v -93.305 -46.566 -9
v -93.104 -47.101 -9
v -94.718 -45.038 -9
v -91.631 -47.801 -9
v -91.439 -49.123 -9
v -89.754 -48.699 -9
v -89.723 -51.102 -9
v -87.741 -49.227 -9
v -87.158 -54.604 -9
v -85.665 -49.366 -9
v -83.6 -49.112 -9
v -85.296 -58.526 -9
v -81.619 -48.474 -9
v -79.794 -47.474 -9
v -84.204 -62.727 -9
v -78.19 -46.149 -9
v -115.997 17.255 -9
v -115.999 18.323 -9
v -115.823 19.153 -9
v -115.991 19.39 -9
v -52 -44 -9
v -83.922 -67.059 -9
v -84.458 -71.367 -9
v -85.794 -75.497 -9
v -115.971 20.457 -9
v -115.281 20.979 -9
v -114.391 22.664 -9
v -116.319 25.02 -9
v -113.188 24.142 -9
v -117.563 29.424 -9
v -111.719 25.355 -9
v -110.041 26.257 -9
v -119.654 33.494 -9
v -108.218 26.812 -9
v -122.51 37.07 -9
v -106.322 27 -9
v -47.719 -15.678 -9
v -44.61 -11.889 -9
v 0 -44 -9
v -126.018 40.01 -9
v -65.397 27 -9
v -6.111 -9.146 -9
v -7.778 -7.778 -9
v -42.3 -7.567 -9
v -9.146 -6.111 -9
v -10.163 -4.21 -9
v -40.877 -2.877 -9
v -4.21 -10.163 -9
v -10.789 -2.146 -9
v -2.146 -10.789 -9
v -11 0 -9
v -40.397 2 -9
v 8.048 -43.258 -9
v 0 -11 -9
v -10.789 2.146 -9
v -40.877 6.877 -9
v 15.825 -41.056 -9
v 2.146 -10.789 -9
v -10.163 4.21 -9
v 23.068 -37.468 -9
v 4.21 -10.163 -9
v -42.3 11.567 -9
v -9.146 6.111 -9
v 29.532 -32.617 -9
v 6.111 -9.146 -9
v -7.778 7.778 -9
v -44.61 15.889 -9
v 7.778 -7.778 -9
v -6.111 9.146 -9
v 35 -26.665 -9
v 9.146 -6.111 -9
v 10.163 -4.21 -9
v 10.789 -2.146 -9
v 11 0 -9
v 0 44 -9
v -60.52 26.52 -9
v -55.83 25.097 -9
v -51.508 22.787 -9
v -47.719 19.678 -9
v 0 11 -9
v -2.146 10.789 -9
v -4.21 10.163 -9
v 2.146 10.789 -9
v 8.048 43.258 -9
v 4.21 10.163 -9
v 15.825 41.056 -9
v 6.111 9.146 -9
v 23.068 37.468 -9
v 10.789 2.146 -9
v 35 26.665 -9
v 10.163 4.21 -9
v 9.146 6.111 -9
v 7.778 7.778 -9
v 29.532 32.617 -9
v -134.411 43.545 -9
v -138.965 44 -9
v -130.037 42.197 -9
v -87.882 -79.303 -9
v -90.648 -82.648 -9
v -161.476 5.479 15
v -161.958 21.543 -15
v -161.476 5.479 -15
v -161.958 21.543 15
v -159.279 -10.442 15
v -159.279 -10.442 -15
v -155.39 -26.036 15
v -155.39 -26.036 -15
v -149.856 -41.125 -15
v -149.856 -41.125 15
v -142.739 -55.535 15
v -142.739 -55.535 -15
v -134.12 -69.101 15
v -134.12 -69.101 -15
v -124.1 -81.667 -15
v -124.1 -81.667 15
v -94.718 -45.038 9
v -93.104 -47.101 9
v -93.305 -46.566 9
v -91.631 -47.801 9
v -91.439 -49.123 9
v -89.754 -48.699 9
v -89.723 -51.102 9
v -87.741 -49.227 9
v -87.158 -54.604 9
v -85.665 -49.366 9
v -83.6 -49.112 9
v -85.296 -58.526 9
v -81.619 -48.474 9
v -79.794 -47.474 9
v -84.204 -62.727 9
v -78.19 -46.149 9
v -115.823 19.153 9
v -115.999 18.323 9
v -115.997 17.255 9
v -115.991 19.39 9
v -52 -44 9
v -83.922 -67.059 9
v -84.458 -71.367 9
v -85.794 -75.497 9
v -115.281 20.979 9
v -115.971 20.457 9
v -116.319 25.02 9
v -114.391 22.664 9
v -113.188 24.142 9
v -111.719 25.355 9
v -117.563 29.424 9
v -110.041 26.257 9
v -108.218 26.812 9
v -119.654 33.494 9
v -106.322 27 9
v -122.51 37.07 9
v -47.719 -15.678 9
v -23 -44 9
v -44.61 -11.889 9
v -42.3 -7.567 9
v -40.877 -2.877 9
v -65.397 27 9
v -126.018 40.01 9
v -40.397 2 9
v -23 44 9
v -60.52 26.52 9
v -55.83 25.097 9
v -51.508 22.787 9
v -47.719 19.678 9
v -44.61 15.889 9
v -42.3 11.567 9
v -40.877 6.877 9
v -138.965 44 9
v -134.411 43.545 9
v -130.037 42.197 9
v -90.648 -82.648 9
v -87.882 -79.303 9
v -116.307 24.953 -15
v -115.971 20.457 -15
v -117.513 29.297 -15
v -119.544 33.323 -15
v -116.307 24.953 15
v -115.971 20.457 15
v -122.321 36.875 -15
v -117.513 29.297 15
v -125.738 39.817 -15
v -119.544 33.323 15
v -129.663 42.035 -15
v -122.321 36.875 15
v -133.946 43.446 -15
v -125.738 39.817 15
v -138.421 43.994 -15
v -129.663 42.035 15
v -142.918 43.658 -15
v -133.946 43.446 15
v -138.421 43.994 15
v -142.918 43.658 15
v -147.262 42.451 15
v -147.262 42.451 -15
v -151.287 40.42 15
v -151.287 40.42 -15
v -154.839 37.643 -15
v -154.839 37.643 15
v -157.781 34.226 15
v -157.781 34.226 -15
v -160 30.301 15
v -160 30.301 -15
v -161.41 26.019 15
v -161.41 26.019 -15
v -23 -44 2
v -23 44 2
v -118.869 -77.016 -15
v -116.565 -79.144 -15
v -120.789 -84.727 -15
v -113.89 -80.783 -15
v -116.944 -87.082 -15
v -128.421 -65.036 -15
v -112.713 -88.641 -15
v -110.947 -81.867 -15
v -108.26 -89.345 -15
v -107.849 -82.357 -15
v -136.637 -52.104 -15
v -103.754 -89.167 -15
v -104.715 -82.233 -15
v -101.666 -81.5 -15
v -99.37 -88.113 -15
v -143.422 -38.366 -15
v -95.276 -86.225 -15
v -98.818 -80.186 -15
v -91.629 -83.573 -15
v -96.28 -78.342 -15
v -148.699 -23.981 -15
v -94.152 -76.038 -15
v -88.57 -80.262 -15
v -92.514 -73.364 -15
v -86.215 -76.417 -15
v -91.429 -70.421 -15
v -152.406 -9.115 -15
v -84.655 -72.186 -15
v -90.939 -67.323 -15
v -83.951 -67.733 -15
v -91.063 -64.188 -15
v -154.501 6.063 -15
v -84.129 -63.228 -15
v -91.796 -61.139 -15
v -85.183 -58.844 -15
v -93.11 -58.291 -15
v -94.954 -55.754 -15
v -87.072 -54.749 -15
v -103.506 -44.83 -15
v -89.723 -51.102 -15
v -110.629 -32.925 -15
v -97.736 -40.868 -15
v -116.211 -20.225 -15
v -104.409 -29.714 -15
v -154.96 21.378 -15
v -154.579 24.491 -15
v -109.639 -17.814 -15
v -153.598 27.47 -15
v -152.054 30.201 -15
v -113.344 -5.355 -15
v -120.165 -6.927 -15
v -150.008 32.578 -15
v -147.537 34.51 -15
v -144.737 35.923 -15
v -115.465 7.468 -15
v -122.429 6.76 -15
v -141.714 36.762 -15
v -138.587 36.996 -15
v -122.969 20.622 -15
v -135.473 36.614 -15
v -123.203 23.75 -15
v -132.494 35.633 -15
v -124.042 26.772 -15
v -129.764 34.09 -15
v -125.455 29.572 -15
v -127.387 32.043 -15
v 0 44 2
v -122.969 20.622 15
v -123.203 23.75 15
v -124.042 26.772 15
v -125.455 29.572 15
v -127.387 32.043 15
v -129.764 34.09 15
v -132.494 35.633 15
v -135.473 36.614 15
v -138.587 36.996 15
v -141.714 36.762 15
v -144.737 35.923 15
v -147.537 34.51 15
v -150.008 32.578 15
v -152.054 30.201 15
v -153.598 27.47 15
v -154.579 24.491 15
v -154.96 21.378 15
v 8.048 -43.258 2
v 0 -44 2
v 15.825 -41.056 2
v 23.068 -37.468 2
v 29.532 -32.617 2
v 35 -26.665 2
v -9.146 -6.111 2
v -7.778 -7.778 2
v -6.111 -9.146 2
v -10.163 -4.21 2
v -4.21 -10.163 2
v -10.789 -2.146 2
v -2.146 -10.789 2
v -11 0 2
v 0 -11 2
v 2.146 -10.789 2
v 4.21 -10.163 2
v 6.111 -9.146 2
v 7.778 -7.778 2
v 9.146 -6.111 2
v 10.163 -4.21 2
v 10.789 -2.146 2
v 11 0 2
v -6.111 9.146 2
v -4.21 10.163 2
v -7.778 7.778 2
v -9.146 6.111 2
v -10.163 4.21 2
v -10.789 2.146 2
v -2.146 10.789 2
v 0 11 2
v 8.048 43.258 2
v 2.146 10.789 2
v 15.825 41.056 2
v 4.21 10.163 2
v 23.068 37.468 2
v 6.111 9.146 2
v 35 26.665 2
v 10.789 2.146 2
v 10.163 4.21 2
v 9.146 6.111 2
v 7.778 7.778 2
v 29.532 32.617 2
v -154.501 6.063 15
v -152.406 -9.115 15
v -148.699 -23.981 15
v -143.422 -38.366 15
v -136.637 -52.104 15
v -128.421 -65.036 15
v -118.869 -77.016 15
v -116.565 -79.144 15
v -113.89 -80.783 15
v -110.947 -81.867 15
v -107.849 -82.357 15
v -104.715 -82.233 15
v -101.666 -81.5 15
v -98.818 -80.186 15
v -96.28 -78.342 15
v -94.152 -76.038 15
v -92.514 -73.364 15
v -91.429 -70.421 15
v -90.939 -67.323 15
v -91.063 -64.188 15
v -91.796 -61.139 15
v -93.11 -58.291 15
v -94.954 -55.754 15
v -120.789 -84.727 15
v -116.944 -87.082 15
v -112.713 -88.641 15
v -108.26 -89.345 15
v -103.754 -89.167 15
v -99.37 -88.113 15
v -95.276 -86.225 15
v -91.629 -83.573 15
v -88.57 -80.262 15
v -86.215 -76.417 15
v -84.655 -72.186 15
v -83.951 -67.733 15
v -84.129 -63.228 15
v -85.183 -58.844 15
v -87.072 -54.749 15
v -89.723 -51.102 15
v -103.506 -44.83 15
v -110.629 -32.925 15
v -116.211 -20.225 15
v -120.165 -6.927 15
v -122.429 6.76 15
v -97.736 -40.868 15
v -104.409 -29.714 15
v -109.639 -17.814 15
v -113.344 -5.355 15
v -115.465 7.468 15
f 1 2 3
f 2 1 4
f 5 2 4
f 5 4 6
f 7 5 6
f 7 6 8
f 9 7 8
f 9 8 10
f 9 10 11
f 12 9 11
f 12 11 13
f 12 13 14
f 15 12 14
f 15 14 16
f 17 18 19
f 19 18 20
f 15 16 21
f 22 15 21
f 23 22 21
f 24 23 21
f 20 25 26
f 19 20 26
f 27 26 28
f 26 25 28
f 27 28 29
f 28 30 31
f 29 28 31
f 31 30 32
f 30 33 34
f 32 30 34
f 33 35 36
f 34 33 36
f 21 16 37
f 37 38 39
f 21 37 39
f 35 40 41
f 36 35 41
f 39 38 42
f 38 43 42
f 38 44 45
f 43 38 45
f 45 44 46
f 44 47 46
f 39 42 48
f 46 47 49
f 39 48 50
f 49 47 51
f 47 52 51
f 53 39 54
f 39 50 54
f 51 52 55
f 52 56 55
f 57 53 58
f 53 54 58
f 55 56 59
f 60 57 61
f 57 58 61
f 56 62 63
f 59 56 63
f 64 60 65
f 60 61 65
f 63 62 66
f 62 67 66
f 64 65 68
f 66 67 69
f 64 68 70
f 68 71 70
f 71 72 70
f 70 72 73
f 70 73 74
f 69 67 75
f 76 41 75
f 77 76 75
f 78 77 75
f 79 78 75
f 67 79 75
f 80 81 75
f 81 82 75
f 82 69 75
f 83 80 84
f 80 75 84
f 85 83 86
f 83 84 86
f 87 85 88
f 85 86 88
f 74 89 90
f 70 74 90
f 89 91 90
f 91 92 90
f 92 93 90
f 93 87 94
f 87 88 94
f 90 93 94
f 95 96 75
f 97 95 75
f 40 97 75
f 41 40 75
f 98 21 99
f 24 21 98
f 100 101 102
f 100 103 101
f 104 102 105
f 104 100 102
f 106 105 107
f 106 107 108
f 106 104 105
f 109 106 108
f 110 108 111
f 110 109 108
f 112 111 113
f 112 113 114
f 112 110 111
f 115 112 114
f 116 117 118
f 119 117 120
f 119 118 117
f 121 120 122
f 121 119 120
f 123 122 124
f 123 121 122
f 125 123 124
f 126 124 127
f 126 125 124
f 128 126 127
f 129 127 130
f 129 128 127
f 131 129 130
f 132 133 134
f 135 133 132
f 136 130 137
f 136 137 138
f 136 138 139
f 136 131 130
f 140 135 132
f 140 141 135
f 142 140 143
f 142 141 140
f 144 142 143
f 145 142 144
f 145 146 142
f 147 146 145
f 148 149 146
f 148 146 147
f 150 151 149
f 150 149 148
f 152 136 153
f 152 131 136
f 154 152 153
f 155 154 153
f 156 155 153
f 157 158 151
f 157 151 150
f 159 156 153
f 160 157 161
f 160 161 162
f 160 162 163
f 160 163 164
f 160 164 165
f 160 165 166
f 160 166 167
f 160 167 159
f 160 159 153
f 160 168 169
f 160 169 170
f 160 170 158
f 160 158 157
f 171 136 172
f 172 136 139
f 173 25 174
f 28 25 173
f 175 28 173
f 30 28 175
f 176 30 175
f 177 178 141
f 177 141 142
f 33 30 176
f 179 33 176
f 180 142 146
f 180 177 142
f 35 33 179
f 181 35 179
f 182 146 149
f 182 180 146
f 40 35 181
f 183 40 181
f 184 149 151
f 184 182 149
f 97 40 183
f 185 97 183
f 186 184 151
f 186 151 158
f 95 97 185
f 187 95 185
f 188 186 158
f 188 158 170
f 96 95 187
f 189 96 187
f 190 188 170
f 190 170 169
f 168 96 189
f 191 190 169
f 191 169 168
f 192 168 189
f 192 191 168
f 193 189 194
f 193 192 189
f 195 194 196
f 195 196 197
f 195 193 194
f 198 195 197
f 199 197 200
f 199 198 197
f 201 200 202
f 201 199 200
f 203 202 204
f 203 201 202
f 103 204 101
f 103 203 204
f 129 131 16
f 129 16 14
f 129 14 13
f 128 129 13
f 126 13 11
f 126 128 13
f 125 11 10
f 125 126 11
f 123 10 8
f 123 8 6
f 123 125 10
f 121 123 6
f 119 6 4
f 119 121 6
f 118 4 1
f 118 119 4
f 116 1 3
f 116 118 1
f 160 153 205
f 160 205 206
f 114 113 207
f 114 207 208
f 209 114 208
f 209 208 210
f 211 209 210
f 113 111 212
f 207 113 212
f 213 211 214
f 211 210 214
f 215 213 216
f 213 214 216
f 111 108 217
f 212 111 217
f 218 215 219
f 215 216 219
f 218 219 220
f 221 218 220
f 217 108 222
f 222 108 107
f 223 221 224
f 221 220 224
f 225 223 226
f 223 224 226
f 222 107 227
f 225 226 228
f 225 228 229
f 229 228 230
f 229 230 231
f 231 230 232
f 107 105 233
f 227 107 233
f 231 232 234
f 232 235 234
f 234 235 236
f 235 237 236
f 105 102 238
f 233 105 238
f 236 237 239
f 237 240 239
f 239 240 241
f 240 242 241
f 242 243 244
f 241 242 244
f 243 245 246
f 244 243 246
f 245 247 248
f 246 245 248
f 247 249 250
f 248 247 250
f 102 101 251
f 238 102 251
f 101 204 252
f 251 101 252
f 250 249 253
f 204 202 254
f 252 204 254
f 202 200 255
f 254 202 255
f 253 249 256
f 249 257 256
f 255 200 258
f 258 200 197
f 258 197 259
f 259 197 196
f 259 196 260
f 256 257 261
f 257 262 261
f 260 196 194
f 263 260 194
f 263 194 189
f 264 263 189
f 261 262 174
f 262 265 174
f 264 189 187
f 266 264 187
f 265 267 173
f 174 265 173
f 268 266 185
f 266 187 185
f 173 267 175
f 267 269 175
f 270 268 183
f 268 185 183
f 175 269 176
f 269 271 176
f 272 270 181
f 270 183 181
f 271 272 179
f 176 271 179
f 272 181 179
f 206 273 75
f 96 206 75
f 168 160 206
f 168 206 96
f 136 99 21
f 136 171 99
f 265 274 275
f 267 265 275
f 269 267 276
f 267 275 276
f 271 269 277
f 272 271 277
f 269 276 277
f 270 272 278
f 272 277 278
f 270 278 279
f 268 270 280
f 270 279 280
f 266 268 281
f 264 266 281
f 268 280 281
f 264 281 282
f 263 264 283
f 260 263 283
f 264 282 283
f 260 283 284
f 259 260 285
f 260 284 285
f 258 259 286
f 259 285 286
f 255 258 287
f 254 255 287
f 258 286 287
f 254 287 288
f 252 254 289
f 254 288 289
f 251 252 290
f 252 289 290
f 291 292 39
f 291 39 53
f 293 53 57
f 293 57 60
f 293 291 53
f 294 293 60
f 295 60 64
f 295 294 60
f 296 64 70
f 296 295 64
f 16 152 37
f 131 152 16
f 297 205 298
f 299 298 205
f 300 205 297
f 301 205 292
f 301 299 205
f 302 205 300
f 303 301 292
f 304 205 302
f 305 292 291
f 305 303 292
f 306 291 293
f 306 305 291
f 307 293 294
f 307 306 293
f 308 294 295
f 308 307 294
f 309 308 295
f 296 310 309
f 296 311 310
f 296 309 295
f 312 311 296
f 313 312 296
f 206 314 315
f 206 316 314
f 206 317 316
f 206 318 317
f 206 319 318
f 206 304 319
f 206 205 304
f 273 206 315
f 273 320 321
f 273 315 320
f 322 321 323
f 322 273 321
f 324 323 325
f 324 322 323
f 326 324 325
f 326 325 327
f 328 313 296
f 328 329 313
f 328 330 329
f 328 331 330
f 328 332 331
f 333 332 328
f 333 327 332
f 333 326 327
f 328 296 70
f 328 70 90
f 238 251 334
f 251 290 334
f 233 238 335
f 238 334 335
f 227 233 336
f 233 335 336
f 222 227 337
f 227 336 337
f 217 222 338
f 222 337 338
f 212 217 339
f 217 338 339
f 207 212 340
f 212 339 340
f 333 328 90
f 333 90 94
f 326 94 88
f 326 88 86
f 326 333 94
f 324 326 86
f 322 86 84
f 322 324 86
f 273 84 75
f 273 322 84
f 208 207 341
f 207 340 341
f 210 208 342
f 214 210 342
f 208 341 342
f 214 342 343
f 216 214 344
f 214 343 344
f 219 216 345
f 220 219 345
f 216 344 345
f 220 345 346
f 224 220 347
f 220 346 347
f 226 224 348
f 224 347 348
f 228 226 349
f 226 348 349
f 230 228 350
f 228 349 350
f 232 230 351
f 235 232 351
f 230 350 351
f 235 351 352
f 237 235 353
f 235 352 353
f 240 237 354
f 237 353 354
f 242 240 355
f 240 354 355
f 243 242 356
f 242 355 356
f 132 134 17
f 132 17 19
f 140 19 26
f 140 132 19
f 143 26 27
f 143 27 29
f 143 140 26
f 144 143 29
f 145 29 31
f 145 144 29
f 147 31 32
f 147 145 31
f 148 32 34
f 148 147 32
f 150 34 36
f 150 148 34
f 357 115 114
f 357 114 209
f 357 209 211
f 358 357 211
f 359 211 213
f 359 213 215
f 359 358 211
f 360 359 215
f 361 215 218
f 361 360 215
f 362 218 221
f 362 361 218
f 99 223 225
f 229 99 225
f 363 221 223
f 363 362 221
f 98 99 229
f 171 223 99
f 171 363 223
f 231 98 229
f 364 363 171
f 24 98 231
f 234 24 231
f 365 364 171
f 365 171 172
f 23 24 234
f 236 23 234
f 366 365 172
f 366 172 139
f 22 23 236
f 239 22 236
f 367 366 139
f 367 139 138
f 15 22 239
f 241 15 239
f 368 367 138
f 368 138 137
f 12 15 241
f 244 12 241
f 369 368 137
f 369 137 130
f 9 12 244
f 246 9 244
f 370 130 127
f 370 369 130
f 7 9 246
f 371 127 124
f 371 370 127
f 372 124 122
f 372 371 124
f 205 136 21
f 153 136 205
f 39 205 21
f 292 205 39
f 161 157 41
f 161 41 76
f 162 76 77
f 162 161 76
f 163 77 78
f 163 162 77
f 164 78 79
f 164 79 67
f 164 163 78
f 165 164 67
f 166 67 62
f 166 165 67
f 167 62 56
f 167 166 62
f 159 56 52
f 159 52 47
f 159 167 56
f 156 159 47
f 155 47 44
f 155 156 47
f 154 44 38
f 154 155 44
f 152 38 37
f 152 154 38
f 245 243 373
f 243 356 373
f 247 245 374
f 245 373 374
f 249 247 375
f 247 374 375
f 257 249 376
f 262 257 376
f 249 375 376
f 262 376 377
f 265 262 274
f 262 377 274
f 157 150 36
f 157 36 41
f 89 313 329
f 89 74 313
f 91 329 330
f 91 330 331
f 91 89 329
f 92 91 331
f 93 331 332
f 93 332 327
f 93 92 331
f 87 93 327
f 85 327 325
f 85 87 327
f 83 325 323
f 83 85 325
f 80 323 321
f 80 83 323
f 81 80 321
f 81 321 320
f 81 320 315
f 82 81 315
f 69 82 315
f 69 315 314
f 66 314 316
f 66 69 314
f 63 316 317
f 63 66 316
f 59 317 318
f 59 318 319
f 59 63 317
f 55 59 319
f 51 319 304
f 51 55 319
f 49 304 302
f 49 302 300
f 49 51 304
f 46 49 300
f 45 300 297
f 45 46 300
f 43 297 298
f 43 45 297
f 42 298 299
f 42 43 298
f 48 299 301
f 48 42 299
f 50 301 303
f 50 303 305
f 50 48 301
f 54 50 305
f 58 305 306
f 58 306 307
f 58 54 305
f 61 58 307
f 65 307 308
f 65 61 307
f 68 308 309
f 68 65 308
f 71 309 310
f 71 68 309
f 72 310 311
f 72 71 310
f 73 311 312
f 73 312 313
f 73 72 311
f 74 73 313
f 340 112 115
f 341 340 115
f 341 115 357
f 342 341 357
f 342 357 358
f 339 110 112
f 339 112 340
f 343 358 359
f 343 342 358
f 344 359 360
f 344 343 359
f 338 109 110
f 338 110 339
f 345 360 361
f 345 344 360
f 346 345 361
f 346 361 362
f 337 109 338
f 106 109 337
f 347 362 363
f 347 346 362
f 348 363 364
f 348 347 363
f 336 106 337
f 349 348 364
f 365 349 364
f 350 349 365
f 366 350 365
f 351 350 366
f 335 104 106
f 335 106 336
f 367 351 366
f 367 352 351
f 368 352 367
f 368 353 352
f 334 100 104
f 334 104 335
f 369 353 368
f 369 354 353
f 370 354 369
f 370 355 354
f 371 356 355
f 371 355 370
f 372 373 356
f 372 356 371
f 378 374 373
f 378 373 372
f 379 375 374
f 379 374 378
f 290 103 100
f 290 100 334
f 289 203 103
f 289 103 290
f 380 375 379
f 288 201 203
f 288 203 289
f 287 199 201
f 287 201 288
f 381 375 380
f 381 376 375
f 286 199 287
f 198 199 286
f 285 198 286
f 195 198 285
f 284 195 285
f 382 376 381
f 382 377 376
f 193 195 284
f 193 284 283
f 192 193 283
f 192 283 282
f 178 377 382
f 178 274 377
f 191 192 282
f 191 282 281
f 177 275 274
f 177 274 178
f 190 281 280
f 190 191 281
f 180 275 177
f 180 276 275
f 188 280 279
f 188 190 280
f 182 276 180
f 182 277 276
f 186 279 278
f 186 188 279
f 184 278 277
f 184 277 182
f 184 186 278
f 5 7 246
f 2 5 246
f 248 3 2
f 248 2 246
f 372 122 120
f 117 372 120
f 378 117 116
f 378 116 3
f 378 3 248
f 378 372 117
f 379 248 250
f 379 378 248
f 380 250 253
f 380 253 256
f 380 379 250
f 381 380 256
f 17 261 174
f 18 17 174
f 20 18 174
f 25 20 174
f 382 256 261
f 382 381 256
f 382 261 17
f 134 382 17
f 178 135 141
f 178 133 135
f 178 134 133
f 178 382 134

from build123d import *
from build123d.topology import SkipClean

# Parameters (mm, degrees)
BOSS_EXTRUDE1_DEPTH = 15
BOSS_EXTRUDE2_DEPTH = 9
BOSS_EXTRUDE3_START = -3.5
SKETCH1_4_R         = 11
BOSS_EXTRUDE3_DEPTH = 5.5


with BuildPart() as part:
    # Sketch1 → Boss-Extrude1 (new, symmetric)
    with BuildSketch(Plane.XY):
        with BuildLine():
            ThreePointArc((-124.10035648, -81.666995927), (-107.585956399, -89.374836112), (-90.648179186, -82.648179186))
            ThreePointArc((-90.648179186, -82.648179186), (-83.921522259, -67.059044464), (-89.722913826, -51.102450509))
            ThreePointArc((-89.722913826, -51.102450509), (-92.277527324, -48.11746068), (-94.717571561, -45.038110339))
            ThreePointArc((-94.717571561, -45.038110339), (-110.416127663, -15.619426166), (-115.997334395, 17.255393583))
            ThreePointArc((-115.997334395, 17.255393583), (-115.99647598, 18.856144662), (-115.970979893, 20.456692913))
            ThreePointArc((-115.970979893, 20.456692913), (-122.51013913, 37.070219927), (-138.964561985, 44))
            ThreePointArc((-138.964561985, 44), (-155.034781912, 37.454422855), (-161.958144077, 21.543307087))
            ThreePointArc((-161.958144077, 21.543307087), (-152.82526794, -33.65504728), (-124.10035648, -81.666995927))
        make_face()
        with BuildLine():
            ThreePointArc((-118.869006511, -77.01586945), (-146.253422103, -31.244478407), (-154.960097353, 21.377952756))
            ThreePointArc((-154.960097353, 21.377952756), (-138.586609229, 36.995535368), (-122.969026617, 20.622047244))
            ThreePointArc((-122.969026617, 20.622047244), (-116.210698276, -20.224734987), (-94.954263795, -55.753576986))
            ThreePointArc((-94.954263795, -55.753576986), (-96.280488921, -78.342094576), (-118.869006511, -77.01586945))
        make_face(mode=Mode.SUBTRACT)
    extrude(amount=BOSS_EXTRUDE1_DEPTH, both=True)

    # Sketch1<3> → Boss-Extrude2 (add, symmetric)
    with SkipClean():  # the faces are left unmerged after this step: merging them gives an invalid solid
        with BuildSketch(Plane.XY):
            with BuildLine():
                Line((-52, -44), (-23, -44))
                Line((-23, -44), (-23, 44))
                Line((-23, 44), (-138.964561985, 44))
                ThreePointArc((-138.964561985, 44), (-122.51013913, 37.070219927), (-115.970979893, 20.456692913))
                ThreePointArc((-115.970979893, 20.456692913), (-115.99647598, 18.856144662), (-115.997334395, 17.255393583))
                ThreePointArc((-115.997334395, 17.255393583), (-113.188190384, 24.141624797), (-106.322248233, 27))
                Line((-106.322248233, 27), (-65.39696962, 27))
                ThreePointArc((-65.39696962, 27), (-42.299981307, 11.567085809), (-47.71930009, -15.67766953))
                Line((-47.71930009, -15.67766953), (-78.190423053, -46.148792492))
                ThreePointArc((-78.190423053, -46.148792492), (-86.706172416, -49.345862018), (-94.717571561, -45.038110339))
                ThreePointArc((-94.717571561, -45.038110339), (-92.277527324, -48.11746068), (-89.722913826, -51.102450509))
                ThreePointArc((-89.722913826, -51.102450509), (-83.921522259, -67.059044464), (-90.648179186, -82.648179186))
                Line((-90.648179186, -82.648179186), (-52, -44))
            make_face()
        extrude(amount=BOSS_EXTRUDE2_DEPTH, both=True)

    # Sketch1<4> → Boss-Extrude3 (add, symmetric)
    with SkipClean():  # the faces are left unmerged after this step: merging them gives an invalid solid
        with BuildSketch(Plane.XY.offset(BOSS_EXTRUDE3_START)):
            with BuildLine():
                Line((-23, -44), (0, -44))
                ThreePointArc((0, -44), (19.528931575, -39.428680317), (35, -26.664583252))
                Line((35, -26.664583252), (35, 26.664583252))
                ThreePointArc((35, 26.664583252), (19.528931575, 39.428680317), (0, 44))
                Line((0, 44), (-23, 44))
                Line((-23, 44), (-23, -44))
            make_face()
            Circle(SKETCH1_4_R, mode=Mode.SUBTRACT)
        extrude(amount=BOSS_EXTRUDE3_DEPTH, both=True)


solid = part.part
